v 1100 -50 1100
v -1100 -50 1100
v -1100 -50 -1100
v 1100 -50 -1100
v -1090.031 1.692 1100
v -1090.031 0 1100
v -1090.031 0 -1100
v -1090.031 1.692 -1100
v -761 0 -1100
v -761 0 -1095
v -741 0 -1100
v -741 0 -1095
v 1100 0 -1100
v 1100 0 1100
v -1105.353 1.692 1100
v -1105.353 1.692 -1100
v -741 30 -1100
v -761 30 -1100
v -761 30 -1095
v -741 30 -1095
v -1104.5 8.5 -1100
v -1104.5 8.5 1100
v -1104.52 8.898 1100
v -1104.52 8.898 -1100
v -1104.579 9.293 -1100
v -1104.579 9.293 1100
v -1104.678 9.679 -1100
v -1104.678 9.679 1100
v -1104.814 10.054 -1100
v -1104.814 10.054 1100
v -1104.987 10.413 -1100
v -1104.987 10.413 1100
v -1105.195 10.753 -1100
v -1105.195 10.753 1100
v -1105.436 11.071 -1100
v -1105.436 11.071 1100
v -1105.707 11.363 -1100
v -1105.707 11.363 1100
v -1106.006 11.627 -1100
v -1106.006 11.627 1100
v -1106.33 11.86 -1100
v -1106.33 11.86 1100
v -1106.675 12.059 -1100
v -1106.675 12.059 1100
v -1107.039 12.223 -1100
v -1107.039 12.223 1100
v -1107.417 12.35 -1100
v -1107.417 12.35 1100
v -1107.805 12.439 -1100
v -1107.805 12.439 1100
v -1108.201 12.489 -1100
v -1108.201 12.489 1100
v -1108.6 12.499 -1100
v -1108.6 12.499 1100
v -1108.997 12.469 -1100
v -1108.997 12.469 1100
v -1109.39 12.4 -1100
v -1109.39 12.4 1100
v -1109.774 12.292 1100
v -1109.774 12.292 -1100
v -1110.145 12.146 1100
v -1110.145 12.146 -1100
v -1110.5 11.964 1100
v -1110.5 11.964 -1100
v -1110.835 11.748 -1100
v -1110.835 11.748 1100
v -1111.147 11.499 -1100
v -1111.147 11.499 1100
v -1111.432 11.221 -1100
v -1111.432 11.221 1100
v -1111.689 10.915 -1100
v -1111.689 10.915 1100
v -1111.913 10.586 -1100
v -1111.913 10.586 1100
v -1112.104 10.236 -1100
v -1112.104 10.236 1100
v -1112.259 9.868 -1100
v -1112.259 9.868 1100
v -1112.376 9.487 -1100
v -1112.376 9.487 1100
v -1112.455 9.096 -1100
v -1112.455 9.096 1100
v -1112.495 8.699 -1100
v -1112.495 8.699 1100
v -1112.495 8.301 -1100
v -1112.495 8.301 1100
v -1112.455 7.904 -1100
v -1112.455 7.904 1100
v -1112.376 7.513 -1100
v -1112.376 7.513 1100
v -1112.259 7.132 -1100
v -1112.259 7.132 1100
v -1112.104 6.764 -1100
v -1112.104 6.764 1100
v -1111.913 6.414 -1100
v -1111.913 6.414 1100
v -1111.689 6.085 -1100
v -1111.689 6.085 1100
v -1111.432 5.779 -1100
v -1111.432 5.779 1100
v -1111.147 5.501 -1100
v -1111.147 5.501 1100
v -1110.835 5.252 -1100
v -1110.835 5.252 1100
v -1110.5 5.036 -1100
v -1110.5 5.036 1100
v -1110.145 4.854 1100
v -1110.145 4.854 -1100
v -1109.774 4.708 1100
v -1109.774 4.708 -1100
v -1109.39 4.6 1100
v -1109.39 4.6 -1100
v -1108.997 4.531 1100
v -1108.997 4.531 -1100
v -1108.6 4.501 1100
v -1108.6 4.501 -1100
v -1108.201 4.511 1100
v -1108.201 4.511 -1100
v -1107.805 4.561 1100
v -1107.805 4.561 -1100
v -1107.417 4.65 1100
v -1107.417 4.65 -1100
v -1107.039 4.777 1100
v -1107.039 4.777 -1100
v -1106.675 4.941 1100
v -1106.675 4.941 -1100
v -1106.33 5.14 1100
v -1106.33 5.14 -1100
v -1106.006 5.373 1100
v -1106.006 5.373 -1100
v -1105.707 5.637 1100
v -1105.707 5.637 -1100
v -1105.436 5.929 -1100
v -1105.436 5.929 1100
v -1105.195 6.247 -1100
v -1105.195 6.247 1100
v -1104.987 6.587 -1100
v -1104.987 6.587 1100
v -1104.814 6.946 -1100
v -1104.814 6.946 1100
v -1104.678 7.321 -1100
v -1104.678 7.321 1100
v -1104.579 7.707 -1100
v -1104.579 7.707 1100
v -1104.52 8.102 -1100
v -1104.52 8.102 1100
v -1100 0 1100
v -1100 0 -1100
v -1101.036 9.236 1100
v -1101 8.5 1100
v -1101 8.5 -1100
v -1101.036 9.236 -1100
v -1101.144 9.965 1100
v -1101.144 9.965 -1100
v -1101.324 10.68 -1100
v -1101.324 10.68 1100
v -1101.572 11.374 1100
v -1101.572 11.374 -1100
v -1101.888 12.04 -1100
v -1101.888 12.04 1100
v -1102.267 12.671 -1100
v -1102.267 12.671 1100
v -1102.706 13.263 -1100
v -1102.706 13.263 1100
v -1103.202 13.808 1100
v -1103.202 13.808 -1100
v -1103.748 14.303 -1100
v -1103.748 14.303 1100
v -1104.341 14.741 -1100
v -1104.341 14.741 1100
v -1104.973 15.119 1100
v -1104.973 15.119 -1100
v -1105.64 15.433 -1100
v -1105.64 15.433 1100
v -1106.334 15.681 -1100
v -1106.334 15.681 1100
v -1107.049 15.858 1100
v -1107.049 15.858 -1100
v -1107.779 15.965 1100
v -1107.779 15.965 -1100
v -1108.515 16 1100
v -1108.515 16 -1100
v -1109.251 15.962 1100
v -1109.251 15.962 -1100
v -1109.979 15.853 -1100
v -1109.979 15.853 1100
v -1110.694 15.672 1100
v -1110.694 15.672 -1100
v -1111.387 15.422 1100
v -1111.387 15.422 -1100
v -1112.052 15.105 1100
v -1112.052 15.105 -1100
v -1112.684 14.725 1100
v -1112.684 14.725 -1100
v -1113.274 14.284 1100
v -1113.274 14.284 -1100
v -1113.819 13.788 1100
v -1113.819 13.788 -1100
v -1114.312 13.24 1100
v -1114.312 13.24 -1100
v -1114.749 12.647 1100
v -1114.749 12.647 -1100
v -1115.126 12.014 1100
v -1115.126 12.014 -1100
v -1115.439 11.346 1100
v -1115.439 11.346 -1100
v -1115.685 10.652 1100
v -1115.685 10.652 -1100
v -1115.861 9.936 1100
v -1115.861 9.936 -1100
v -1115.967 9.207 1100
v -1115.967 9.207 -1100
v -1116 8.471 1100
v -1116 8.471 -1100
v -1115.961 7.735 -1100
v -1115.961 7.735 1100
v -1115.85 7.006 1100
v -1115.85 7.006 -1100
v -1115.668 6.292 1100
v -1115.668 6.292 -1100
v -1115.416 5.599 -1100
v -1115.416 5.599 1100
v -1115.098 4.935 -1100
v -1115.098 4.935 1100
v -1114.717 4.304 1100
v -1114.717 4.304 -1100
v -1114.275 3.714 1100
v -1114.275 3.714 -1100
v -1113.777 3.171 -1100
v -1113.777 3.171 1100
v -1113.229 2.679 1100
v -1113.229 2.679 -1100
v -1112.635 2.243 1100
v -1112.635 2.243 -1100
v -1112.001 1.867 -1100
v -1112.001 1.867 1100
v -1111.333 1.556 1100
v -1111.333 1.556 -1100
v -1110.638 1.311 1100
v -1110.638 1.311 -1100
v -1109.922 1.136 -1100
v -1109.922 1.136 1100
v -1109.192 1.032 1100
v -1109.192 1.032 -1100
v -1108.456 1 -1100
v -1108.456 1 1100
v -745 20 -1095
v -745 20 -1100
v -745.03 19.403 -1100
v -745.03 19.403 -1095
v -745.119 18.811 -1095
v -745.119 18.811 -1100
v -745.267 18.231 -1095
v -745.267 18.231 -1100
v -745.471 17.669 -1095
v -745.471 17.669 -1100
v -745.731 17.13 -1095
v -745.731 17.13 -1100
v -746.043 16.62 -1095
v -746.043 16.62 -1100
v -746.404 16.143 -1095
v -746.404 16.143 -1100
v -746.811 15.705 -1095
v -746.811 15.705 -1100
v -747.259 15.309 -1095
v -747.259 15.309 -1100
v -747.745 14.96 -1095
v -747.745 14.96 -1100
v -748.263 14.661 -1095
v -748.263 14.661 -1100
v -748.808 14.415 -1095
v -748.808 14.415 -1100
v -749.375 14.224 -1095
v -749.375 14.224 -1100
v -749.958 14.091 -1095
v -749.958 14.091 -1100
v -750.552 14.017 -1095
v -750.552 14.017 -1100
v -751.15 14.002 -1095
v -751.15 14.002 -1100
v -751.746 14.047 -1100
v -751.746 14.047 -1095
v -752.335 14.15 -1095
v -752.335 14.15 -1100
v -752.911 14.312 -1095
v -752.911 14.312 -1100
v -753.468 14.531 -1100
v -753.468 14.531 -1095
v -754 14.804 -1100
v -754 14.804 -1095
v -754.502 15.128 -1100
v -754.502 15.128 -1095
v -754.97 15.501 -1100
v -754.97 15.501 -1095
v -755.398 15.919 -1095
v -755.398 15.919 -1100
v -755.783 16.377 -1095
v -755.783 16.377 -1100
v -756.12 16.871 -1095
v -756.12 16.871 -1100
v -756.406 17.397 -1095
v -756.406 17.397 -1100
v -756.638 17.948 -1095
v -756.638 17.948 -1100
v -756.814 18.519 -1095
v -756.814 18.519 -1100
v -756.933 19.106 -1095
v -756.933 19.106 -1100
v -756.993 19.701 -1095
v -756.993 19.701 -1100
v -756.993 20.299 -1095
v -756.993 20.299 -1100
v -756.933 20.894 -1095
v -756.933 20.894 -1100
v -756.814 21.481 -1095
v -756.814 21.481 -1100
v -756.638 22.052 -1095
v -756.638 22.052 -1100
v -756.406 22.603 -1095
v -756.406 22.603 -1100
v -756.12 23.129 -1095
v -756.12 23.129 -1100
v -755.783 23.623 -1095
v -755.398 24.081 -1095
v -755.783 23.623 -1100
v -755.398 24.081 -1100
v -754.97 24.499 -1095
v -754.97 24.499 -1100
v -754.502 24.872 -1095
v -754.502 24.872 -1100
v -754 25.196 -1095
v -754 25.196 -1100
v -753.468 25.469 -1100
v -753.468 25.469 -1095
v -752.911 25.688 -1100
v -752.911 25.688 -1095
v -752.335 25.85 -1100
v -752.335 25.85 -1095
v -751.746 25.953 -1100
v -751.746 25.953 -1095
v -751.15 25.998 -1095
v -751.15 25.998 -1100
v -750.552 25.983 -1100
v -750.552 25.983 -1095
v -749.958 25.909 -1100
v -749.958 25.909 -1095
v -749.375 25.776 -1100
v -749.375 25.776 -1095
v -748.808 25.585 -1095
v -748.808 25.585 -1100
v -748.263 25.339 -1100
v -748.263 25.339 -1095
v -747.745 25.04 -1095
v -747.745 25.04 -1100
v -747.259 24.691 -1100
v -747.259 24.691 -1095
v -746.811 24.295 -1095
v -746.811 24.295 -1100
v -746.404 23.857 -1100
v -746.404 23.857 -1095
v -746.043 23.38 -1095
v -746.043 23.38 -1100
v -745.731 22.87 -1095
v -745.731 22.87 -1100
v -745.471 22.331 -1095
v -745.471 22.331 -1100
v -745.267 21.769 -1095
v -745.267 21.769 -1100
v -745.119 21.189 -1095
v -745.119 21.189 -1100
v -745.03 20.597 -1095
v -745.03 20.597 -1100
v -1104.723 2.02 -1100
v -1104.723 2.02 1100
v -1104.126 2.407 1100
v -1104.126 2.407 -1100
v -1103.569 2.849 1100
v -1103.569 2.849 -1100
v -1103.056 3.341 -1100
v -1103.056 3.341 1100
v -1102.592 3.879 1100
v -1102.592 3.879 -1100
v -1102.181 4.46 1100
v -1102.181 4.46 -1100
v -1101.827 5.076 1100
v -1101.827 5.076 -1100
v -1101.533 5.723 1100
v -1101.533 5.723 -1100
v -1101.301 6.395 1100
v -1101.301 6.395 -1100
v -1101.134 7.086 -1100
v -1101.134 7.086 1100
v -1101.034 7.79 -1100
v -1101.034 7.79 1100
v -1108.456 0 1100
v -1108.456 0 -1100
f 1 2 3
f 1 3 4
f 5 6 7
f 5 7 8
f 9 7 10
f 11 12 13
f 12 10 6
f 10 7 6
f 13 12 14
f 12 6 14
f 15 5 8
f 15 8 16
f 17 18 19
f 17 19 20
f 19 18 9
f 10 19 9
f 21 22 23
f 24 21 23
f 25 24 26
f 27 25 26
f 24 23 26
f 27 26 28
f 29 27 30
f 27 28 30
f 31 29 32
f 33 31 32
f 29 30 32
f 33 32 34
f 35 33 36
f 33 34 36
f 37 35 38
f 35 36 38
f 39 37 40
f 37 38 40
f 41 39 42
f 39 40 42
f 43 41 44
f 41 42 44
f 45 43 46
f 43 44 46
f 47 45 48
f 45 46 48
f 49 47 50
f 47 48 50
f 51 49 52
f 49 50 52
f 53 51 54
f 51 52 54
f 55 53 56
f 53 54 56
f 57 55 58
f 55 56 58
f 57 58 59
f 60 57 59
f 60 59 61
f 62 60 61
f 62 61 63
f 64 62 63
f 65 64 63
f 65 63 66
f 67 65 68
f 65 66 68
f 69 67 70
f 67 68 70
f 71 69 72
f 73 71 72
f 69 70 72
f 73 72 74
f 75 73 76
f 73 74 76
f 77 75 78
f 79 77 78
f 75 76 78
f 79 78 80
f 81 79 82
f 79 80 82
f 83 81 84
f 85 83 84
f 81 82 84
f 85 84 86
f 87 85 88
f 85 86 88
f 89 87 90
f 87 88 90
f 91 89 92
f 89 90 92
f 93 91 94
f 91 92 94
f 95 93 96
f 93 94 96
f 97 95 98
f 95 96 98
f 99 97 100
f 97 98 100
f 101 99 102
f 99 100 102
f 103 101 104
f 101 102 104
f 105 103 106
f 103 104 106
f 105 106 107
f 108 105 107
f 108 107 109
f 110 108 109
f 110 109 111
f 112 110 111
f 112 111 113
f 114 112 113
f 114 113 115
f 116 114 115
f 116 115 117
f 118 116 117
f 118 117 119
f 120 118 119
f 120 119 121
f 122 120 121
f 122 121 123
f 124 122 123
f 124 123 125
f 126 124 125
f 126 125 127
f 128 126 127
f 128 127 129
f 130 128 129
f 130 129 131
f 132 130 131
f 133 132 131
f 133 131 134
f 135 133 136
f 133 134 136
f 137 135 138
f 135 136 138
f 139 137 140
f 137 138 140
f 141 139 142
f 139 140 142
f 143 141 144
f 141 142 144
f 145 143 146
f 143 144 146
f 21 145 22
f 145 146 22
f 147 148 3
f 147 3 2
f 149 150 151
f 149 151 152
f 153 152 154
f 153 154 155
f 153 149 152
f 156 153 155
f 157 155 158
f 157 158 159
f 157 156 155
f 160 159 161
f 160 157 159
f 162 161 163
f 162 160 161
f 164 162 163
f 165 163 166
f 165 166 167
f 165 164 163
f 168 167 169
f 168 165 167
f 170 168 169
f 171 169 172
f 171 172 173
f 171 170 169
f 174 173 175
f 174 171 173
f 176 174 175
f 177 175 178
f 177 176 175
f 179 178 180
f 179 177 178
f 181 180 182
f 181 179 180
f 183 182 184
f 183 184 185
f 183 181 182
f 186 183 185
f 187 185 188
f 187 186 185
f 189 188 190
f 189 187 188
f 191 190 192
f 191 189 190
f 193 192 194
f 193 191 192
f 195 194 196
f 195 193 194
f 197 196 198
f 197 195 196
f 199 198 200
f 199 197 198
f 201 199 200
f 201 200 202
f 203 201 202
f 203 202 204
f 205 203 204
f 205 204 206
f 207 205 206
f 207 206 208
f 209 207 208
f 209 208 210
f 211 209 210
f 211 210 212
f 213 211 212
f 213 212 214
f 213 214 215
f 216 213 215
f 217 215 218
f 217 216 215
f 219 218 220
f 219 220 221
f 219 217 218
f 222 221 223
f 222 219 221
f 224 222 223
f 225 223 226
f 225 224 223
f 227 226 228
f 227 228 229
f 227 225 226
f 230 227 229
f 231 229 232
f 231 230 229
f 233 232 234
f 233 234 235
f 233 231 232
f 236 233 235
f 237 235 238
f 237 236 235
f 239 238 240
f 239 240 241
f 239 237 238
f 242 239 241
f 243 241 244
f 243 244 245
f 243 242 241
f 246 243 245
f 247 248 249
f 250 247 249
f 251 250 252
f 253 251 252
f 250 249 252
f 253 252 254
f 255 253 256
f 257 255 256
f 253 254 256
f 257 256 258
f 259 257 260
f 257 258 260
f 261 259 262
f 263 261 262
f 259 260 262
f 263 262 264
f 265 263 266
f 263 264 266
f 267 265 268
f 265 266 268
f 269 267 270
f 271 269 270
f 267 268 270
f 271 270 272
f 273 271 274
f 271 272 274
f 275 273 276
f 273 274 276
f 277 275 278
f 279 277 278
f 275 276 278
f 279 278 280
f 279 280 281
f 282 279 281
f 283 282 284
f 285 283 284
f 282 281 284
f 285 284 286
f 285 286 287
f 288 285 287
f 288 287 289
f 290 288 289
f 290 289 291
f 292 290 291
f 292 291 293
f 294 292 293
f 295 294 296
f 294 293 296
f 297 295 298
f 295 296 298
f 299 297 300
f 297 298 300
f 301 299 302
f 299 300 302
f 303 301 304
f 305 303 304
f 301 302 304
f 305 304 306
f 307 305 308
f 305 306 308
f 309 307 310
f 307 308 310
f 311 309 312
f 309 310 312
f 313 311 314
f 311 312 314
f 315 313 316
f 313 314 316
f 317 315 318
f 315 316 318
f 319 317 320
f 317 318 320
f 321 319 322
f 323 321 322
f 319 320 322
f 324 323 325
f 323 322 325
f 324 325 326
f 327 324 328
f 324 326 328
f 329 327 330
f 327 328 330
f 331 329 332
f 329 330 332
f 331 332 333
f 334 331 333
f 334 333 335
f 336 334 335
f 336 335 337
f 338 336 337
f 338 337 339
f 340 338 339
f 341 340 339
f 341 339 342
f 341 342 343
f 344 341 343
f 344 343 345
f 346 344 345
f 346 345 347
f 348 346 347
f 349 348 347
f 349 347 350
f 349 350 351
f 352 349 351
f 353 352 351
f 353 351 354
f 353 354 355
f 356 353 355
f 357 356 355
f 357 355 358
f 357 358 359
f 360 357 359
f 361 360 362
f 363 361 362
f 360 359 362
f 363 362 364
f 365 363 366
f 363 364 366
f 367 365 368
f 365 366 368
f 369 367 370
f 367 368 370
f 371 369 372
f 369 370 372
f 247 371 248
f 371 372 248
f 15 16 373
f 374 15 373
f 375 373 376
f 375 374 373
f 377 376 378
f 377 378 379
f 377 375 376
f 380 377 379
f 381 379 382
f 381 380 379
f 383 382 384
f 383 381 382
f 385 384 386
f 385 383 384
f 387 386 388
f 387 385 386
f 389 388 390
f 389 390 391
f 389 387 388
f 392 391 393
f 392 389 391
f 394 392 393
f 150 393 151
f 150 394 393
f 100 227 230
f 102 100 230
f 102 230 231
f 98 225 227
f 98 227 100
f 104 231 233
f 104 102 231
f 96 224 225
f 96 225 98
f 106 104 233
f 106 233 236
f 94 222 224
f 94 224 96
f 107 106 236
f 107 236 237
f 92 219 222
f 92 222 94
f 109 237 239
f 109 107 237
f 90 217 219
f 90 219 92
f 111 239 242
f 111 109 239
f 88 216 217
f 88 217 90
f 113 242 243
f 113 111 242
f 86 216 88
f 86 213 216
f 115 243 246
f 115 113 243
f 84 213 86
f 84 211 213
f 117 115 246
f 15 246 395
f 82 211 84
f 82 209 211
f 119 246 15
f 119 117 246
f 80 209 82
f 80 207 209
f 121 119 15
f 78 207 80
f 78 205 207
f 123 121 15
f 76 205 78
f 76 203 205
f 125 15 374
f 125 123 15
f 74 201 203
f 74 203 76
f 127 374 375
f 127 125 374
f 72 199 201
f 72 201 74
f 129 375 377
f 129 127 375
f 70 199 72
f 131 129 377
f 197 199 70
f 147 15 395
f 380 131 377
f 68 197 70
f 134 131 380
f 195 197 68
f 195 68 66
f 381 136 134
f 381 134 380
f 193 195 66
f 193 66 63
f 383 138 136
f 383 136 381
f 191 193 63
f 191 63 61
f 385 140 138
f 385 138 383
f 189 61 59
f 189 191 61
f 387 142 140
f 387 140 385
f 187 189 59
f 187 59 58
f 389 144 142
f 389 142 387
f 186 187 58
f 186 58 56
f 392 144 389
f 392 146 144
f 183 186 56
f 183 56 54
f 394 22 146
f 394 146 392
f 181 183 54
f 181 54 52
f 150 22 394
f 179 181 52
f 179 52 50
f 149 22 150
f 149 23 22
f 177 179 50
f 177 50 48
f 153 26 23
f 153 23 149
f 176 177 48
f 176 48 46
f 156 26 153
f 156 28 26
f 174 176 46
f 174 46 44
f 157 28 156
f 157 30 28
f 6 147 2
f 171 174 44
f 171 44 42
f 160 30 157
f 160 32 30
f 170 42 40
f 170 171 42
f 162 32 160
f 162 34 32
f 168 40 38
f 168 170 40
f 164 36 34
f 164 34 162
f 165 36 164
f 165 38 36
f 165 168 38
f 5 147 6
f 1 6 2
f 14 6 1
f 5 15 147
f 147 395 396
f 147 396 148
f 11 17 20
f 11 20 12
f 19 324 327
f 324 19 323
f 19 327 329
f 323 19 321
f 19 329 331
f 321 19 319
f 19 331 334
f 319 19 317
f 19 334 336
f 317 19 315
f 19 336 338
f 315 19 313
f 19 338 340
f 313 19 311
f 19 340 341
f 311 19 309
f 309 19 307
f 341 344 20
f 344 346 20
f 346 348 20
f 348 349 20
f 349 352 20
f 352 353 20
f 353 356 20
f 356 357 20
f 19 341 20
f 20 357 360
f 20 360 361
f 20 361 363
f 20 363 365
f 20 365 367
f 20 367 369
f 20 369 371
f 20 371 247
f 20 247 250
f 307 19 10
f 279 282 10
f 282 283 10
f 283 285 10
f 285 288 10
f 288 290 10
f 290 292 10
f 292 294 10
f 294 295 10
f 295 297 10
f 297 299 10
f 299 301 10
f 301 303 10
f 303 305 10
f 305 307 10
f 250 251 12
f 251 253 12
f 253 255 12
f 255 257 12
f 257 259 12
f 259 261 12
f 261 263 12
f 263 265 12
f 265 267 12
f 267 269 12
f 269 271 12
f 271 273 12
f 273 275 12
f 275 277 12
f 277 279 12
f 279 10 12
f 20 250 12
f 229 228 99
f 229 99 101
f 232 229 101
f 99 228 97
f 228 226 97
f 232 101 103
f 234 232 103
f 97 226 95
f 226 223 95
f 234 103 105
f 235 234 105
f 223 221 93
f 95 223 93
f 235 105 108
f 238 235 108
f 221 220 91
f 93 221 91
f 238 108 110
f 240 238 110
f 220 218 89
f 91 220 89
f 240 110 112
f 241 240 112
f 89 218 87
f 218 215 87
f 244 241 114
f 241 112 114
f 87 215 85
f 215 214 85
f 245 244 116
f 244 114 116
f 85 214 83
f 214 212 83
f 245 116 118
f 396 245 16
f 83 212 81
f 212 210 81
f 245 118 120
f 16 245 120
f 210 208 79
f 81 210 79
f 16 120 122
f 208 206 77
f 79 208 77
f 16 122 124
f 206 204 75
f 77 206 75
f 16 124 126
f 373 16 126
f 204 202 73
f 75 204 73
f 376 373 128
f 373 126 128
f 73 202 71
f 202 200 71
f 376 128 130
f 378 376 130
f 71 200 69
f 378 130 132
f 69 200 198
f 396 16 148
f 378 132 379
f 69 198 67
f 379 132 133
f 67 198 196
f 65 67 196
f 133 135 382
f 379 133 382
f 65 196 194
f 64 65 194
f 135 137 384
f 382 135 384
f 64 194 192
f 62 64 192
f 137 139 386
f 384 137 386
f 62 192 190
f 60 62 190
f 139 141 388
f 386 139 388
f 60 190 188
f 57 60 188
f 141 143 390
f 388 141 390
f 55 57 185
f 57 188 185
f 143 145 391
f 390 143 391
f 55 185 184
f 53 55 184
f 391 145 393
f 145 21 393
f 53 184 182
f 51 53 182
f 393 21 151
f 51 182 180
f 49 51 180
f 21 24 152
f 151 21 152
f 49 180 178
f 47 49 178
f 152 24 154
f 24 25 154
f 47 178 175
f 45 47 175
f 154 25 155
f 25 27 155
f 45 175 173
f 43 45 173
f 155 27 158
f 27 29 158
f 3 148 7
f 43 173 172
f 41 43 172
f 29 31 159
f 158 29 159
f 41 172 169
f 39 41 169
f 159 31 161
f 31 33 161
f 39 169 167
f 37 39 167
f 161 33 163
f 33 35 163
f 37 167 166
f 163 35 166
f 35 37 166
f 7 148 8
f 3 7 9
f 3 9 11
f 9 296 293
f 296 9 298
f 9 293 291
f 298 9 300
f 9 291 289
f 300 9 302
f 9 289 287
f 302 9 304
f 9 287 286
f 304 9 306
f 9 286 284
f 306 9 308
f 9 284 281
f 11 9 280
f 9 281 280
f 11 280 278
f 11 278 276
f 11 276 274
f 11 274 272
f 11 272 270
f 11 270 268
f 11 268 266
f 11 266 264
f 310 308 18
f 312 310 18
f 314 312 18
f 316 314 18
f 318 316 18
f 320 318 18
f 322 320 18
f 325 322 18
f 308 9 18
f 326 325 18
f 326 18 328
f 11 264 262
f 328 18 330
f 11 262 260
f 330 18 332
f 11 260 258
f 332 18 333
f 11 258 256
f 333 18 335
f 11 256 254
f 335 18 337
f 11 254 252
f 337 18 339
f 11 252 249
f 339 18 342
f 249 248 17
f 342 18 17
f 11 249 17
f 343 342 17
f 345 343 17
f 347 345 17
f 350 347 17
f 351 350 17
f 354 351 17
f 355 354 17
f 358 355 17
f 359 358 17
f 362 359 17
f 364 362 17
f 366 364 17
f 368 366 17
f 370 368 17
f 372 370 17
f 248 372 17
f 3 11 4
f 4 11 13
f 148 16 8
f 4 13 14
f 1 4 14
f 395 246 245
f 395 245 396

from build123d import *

# Parameters (mm, degrees)
F0_W     = 2200
F0_H     = 2200
F1_DEPTH = 50
F2_R     = 4
F3_DEPTH = 2200
F4_W     = 20
F4_H     = 30
F4_R     = 6
F5_DEPTH = 5


with BuildPart() as f1:
    # F0 (on Front) → F1 (new body)
    with BuildSketch(Plane.XZ):
        Rectangle(F0_W, F0_H)
    extrude(amount=F1_DEPTH)

    # F2 (on face) → F3 (join)
    with BuildSketch(Plane.XY.offset(1100)):
        with BuildLine():
            ThreePointArc((-1105.353447, 1.691975), (-1102.181411, 4.459526), (-1101, 8.5))
            ThreePointArc((-1101, 8.5), (-1113.818829, 13.787727), (-1108.456016, 1.000129))
            ThreePointArc((-1108.456016, 1.000129), (-1106.867657, 1.179791), (-1105.353447, 1.691975))
        make_face()
        with Locations((-1108.5, 8.5)):
            Circle(F2_R, mode=Mode.SUBTRACT)
        with BuildLine():
            ThreePointArc((-1105.353447, 1.691975), (-1106.867657, 1.179791), (-1108.456016, 1.000129))
            Line((-1108.456016, 1.000129), (-1108.456016, 0))
            Line((-1108.456016, 0), (-1100, 0))
            Line((-1100, 0), (-1090.031385, 0))
            Line((-1090.031385, 0), (-1090.031385, 1.691975))
            Line((-1090.031385, 1.691975), (-1105.353447, 1.691975))
        make_face()
    extrude(amount=-F3_DEPTH)

    # F4 (on face) → F5 (join)
    with BuildSketch(Plane(origin=(0, 0, -1100), x_dir=(1, 0, 0), z_dir=(0, 0, -1))):
        with Locations((-751, -15)):
            Rectangle(F4_W, F4_H)
        with Locations((-751, -20)):
            Circle(F4_R, mode=Mode.SUBTRACT)
    extrude(amount=-F5_DEPTH)


solid = f1.part
